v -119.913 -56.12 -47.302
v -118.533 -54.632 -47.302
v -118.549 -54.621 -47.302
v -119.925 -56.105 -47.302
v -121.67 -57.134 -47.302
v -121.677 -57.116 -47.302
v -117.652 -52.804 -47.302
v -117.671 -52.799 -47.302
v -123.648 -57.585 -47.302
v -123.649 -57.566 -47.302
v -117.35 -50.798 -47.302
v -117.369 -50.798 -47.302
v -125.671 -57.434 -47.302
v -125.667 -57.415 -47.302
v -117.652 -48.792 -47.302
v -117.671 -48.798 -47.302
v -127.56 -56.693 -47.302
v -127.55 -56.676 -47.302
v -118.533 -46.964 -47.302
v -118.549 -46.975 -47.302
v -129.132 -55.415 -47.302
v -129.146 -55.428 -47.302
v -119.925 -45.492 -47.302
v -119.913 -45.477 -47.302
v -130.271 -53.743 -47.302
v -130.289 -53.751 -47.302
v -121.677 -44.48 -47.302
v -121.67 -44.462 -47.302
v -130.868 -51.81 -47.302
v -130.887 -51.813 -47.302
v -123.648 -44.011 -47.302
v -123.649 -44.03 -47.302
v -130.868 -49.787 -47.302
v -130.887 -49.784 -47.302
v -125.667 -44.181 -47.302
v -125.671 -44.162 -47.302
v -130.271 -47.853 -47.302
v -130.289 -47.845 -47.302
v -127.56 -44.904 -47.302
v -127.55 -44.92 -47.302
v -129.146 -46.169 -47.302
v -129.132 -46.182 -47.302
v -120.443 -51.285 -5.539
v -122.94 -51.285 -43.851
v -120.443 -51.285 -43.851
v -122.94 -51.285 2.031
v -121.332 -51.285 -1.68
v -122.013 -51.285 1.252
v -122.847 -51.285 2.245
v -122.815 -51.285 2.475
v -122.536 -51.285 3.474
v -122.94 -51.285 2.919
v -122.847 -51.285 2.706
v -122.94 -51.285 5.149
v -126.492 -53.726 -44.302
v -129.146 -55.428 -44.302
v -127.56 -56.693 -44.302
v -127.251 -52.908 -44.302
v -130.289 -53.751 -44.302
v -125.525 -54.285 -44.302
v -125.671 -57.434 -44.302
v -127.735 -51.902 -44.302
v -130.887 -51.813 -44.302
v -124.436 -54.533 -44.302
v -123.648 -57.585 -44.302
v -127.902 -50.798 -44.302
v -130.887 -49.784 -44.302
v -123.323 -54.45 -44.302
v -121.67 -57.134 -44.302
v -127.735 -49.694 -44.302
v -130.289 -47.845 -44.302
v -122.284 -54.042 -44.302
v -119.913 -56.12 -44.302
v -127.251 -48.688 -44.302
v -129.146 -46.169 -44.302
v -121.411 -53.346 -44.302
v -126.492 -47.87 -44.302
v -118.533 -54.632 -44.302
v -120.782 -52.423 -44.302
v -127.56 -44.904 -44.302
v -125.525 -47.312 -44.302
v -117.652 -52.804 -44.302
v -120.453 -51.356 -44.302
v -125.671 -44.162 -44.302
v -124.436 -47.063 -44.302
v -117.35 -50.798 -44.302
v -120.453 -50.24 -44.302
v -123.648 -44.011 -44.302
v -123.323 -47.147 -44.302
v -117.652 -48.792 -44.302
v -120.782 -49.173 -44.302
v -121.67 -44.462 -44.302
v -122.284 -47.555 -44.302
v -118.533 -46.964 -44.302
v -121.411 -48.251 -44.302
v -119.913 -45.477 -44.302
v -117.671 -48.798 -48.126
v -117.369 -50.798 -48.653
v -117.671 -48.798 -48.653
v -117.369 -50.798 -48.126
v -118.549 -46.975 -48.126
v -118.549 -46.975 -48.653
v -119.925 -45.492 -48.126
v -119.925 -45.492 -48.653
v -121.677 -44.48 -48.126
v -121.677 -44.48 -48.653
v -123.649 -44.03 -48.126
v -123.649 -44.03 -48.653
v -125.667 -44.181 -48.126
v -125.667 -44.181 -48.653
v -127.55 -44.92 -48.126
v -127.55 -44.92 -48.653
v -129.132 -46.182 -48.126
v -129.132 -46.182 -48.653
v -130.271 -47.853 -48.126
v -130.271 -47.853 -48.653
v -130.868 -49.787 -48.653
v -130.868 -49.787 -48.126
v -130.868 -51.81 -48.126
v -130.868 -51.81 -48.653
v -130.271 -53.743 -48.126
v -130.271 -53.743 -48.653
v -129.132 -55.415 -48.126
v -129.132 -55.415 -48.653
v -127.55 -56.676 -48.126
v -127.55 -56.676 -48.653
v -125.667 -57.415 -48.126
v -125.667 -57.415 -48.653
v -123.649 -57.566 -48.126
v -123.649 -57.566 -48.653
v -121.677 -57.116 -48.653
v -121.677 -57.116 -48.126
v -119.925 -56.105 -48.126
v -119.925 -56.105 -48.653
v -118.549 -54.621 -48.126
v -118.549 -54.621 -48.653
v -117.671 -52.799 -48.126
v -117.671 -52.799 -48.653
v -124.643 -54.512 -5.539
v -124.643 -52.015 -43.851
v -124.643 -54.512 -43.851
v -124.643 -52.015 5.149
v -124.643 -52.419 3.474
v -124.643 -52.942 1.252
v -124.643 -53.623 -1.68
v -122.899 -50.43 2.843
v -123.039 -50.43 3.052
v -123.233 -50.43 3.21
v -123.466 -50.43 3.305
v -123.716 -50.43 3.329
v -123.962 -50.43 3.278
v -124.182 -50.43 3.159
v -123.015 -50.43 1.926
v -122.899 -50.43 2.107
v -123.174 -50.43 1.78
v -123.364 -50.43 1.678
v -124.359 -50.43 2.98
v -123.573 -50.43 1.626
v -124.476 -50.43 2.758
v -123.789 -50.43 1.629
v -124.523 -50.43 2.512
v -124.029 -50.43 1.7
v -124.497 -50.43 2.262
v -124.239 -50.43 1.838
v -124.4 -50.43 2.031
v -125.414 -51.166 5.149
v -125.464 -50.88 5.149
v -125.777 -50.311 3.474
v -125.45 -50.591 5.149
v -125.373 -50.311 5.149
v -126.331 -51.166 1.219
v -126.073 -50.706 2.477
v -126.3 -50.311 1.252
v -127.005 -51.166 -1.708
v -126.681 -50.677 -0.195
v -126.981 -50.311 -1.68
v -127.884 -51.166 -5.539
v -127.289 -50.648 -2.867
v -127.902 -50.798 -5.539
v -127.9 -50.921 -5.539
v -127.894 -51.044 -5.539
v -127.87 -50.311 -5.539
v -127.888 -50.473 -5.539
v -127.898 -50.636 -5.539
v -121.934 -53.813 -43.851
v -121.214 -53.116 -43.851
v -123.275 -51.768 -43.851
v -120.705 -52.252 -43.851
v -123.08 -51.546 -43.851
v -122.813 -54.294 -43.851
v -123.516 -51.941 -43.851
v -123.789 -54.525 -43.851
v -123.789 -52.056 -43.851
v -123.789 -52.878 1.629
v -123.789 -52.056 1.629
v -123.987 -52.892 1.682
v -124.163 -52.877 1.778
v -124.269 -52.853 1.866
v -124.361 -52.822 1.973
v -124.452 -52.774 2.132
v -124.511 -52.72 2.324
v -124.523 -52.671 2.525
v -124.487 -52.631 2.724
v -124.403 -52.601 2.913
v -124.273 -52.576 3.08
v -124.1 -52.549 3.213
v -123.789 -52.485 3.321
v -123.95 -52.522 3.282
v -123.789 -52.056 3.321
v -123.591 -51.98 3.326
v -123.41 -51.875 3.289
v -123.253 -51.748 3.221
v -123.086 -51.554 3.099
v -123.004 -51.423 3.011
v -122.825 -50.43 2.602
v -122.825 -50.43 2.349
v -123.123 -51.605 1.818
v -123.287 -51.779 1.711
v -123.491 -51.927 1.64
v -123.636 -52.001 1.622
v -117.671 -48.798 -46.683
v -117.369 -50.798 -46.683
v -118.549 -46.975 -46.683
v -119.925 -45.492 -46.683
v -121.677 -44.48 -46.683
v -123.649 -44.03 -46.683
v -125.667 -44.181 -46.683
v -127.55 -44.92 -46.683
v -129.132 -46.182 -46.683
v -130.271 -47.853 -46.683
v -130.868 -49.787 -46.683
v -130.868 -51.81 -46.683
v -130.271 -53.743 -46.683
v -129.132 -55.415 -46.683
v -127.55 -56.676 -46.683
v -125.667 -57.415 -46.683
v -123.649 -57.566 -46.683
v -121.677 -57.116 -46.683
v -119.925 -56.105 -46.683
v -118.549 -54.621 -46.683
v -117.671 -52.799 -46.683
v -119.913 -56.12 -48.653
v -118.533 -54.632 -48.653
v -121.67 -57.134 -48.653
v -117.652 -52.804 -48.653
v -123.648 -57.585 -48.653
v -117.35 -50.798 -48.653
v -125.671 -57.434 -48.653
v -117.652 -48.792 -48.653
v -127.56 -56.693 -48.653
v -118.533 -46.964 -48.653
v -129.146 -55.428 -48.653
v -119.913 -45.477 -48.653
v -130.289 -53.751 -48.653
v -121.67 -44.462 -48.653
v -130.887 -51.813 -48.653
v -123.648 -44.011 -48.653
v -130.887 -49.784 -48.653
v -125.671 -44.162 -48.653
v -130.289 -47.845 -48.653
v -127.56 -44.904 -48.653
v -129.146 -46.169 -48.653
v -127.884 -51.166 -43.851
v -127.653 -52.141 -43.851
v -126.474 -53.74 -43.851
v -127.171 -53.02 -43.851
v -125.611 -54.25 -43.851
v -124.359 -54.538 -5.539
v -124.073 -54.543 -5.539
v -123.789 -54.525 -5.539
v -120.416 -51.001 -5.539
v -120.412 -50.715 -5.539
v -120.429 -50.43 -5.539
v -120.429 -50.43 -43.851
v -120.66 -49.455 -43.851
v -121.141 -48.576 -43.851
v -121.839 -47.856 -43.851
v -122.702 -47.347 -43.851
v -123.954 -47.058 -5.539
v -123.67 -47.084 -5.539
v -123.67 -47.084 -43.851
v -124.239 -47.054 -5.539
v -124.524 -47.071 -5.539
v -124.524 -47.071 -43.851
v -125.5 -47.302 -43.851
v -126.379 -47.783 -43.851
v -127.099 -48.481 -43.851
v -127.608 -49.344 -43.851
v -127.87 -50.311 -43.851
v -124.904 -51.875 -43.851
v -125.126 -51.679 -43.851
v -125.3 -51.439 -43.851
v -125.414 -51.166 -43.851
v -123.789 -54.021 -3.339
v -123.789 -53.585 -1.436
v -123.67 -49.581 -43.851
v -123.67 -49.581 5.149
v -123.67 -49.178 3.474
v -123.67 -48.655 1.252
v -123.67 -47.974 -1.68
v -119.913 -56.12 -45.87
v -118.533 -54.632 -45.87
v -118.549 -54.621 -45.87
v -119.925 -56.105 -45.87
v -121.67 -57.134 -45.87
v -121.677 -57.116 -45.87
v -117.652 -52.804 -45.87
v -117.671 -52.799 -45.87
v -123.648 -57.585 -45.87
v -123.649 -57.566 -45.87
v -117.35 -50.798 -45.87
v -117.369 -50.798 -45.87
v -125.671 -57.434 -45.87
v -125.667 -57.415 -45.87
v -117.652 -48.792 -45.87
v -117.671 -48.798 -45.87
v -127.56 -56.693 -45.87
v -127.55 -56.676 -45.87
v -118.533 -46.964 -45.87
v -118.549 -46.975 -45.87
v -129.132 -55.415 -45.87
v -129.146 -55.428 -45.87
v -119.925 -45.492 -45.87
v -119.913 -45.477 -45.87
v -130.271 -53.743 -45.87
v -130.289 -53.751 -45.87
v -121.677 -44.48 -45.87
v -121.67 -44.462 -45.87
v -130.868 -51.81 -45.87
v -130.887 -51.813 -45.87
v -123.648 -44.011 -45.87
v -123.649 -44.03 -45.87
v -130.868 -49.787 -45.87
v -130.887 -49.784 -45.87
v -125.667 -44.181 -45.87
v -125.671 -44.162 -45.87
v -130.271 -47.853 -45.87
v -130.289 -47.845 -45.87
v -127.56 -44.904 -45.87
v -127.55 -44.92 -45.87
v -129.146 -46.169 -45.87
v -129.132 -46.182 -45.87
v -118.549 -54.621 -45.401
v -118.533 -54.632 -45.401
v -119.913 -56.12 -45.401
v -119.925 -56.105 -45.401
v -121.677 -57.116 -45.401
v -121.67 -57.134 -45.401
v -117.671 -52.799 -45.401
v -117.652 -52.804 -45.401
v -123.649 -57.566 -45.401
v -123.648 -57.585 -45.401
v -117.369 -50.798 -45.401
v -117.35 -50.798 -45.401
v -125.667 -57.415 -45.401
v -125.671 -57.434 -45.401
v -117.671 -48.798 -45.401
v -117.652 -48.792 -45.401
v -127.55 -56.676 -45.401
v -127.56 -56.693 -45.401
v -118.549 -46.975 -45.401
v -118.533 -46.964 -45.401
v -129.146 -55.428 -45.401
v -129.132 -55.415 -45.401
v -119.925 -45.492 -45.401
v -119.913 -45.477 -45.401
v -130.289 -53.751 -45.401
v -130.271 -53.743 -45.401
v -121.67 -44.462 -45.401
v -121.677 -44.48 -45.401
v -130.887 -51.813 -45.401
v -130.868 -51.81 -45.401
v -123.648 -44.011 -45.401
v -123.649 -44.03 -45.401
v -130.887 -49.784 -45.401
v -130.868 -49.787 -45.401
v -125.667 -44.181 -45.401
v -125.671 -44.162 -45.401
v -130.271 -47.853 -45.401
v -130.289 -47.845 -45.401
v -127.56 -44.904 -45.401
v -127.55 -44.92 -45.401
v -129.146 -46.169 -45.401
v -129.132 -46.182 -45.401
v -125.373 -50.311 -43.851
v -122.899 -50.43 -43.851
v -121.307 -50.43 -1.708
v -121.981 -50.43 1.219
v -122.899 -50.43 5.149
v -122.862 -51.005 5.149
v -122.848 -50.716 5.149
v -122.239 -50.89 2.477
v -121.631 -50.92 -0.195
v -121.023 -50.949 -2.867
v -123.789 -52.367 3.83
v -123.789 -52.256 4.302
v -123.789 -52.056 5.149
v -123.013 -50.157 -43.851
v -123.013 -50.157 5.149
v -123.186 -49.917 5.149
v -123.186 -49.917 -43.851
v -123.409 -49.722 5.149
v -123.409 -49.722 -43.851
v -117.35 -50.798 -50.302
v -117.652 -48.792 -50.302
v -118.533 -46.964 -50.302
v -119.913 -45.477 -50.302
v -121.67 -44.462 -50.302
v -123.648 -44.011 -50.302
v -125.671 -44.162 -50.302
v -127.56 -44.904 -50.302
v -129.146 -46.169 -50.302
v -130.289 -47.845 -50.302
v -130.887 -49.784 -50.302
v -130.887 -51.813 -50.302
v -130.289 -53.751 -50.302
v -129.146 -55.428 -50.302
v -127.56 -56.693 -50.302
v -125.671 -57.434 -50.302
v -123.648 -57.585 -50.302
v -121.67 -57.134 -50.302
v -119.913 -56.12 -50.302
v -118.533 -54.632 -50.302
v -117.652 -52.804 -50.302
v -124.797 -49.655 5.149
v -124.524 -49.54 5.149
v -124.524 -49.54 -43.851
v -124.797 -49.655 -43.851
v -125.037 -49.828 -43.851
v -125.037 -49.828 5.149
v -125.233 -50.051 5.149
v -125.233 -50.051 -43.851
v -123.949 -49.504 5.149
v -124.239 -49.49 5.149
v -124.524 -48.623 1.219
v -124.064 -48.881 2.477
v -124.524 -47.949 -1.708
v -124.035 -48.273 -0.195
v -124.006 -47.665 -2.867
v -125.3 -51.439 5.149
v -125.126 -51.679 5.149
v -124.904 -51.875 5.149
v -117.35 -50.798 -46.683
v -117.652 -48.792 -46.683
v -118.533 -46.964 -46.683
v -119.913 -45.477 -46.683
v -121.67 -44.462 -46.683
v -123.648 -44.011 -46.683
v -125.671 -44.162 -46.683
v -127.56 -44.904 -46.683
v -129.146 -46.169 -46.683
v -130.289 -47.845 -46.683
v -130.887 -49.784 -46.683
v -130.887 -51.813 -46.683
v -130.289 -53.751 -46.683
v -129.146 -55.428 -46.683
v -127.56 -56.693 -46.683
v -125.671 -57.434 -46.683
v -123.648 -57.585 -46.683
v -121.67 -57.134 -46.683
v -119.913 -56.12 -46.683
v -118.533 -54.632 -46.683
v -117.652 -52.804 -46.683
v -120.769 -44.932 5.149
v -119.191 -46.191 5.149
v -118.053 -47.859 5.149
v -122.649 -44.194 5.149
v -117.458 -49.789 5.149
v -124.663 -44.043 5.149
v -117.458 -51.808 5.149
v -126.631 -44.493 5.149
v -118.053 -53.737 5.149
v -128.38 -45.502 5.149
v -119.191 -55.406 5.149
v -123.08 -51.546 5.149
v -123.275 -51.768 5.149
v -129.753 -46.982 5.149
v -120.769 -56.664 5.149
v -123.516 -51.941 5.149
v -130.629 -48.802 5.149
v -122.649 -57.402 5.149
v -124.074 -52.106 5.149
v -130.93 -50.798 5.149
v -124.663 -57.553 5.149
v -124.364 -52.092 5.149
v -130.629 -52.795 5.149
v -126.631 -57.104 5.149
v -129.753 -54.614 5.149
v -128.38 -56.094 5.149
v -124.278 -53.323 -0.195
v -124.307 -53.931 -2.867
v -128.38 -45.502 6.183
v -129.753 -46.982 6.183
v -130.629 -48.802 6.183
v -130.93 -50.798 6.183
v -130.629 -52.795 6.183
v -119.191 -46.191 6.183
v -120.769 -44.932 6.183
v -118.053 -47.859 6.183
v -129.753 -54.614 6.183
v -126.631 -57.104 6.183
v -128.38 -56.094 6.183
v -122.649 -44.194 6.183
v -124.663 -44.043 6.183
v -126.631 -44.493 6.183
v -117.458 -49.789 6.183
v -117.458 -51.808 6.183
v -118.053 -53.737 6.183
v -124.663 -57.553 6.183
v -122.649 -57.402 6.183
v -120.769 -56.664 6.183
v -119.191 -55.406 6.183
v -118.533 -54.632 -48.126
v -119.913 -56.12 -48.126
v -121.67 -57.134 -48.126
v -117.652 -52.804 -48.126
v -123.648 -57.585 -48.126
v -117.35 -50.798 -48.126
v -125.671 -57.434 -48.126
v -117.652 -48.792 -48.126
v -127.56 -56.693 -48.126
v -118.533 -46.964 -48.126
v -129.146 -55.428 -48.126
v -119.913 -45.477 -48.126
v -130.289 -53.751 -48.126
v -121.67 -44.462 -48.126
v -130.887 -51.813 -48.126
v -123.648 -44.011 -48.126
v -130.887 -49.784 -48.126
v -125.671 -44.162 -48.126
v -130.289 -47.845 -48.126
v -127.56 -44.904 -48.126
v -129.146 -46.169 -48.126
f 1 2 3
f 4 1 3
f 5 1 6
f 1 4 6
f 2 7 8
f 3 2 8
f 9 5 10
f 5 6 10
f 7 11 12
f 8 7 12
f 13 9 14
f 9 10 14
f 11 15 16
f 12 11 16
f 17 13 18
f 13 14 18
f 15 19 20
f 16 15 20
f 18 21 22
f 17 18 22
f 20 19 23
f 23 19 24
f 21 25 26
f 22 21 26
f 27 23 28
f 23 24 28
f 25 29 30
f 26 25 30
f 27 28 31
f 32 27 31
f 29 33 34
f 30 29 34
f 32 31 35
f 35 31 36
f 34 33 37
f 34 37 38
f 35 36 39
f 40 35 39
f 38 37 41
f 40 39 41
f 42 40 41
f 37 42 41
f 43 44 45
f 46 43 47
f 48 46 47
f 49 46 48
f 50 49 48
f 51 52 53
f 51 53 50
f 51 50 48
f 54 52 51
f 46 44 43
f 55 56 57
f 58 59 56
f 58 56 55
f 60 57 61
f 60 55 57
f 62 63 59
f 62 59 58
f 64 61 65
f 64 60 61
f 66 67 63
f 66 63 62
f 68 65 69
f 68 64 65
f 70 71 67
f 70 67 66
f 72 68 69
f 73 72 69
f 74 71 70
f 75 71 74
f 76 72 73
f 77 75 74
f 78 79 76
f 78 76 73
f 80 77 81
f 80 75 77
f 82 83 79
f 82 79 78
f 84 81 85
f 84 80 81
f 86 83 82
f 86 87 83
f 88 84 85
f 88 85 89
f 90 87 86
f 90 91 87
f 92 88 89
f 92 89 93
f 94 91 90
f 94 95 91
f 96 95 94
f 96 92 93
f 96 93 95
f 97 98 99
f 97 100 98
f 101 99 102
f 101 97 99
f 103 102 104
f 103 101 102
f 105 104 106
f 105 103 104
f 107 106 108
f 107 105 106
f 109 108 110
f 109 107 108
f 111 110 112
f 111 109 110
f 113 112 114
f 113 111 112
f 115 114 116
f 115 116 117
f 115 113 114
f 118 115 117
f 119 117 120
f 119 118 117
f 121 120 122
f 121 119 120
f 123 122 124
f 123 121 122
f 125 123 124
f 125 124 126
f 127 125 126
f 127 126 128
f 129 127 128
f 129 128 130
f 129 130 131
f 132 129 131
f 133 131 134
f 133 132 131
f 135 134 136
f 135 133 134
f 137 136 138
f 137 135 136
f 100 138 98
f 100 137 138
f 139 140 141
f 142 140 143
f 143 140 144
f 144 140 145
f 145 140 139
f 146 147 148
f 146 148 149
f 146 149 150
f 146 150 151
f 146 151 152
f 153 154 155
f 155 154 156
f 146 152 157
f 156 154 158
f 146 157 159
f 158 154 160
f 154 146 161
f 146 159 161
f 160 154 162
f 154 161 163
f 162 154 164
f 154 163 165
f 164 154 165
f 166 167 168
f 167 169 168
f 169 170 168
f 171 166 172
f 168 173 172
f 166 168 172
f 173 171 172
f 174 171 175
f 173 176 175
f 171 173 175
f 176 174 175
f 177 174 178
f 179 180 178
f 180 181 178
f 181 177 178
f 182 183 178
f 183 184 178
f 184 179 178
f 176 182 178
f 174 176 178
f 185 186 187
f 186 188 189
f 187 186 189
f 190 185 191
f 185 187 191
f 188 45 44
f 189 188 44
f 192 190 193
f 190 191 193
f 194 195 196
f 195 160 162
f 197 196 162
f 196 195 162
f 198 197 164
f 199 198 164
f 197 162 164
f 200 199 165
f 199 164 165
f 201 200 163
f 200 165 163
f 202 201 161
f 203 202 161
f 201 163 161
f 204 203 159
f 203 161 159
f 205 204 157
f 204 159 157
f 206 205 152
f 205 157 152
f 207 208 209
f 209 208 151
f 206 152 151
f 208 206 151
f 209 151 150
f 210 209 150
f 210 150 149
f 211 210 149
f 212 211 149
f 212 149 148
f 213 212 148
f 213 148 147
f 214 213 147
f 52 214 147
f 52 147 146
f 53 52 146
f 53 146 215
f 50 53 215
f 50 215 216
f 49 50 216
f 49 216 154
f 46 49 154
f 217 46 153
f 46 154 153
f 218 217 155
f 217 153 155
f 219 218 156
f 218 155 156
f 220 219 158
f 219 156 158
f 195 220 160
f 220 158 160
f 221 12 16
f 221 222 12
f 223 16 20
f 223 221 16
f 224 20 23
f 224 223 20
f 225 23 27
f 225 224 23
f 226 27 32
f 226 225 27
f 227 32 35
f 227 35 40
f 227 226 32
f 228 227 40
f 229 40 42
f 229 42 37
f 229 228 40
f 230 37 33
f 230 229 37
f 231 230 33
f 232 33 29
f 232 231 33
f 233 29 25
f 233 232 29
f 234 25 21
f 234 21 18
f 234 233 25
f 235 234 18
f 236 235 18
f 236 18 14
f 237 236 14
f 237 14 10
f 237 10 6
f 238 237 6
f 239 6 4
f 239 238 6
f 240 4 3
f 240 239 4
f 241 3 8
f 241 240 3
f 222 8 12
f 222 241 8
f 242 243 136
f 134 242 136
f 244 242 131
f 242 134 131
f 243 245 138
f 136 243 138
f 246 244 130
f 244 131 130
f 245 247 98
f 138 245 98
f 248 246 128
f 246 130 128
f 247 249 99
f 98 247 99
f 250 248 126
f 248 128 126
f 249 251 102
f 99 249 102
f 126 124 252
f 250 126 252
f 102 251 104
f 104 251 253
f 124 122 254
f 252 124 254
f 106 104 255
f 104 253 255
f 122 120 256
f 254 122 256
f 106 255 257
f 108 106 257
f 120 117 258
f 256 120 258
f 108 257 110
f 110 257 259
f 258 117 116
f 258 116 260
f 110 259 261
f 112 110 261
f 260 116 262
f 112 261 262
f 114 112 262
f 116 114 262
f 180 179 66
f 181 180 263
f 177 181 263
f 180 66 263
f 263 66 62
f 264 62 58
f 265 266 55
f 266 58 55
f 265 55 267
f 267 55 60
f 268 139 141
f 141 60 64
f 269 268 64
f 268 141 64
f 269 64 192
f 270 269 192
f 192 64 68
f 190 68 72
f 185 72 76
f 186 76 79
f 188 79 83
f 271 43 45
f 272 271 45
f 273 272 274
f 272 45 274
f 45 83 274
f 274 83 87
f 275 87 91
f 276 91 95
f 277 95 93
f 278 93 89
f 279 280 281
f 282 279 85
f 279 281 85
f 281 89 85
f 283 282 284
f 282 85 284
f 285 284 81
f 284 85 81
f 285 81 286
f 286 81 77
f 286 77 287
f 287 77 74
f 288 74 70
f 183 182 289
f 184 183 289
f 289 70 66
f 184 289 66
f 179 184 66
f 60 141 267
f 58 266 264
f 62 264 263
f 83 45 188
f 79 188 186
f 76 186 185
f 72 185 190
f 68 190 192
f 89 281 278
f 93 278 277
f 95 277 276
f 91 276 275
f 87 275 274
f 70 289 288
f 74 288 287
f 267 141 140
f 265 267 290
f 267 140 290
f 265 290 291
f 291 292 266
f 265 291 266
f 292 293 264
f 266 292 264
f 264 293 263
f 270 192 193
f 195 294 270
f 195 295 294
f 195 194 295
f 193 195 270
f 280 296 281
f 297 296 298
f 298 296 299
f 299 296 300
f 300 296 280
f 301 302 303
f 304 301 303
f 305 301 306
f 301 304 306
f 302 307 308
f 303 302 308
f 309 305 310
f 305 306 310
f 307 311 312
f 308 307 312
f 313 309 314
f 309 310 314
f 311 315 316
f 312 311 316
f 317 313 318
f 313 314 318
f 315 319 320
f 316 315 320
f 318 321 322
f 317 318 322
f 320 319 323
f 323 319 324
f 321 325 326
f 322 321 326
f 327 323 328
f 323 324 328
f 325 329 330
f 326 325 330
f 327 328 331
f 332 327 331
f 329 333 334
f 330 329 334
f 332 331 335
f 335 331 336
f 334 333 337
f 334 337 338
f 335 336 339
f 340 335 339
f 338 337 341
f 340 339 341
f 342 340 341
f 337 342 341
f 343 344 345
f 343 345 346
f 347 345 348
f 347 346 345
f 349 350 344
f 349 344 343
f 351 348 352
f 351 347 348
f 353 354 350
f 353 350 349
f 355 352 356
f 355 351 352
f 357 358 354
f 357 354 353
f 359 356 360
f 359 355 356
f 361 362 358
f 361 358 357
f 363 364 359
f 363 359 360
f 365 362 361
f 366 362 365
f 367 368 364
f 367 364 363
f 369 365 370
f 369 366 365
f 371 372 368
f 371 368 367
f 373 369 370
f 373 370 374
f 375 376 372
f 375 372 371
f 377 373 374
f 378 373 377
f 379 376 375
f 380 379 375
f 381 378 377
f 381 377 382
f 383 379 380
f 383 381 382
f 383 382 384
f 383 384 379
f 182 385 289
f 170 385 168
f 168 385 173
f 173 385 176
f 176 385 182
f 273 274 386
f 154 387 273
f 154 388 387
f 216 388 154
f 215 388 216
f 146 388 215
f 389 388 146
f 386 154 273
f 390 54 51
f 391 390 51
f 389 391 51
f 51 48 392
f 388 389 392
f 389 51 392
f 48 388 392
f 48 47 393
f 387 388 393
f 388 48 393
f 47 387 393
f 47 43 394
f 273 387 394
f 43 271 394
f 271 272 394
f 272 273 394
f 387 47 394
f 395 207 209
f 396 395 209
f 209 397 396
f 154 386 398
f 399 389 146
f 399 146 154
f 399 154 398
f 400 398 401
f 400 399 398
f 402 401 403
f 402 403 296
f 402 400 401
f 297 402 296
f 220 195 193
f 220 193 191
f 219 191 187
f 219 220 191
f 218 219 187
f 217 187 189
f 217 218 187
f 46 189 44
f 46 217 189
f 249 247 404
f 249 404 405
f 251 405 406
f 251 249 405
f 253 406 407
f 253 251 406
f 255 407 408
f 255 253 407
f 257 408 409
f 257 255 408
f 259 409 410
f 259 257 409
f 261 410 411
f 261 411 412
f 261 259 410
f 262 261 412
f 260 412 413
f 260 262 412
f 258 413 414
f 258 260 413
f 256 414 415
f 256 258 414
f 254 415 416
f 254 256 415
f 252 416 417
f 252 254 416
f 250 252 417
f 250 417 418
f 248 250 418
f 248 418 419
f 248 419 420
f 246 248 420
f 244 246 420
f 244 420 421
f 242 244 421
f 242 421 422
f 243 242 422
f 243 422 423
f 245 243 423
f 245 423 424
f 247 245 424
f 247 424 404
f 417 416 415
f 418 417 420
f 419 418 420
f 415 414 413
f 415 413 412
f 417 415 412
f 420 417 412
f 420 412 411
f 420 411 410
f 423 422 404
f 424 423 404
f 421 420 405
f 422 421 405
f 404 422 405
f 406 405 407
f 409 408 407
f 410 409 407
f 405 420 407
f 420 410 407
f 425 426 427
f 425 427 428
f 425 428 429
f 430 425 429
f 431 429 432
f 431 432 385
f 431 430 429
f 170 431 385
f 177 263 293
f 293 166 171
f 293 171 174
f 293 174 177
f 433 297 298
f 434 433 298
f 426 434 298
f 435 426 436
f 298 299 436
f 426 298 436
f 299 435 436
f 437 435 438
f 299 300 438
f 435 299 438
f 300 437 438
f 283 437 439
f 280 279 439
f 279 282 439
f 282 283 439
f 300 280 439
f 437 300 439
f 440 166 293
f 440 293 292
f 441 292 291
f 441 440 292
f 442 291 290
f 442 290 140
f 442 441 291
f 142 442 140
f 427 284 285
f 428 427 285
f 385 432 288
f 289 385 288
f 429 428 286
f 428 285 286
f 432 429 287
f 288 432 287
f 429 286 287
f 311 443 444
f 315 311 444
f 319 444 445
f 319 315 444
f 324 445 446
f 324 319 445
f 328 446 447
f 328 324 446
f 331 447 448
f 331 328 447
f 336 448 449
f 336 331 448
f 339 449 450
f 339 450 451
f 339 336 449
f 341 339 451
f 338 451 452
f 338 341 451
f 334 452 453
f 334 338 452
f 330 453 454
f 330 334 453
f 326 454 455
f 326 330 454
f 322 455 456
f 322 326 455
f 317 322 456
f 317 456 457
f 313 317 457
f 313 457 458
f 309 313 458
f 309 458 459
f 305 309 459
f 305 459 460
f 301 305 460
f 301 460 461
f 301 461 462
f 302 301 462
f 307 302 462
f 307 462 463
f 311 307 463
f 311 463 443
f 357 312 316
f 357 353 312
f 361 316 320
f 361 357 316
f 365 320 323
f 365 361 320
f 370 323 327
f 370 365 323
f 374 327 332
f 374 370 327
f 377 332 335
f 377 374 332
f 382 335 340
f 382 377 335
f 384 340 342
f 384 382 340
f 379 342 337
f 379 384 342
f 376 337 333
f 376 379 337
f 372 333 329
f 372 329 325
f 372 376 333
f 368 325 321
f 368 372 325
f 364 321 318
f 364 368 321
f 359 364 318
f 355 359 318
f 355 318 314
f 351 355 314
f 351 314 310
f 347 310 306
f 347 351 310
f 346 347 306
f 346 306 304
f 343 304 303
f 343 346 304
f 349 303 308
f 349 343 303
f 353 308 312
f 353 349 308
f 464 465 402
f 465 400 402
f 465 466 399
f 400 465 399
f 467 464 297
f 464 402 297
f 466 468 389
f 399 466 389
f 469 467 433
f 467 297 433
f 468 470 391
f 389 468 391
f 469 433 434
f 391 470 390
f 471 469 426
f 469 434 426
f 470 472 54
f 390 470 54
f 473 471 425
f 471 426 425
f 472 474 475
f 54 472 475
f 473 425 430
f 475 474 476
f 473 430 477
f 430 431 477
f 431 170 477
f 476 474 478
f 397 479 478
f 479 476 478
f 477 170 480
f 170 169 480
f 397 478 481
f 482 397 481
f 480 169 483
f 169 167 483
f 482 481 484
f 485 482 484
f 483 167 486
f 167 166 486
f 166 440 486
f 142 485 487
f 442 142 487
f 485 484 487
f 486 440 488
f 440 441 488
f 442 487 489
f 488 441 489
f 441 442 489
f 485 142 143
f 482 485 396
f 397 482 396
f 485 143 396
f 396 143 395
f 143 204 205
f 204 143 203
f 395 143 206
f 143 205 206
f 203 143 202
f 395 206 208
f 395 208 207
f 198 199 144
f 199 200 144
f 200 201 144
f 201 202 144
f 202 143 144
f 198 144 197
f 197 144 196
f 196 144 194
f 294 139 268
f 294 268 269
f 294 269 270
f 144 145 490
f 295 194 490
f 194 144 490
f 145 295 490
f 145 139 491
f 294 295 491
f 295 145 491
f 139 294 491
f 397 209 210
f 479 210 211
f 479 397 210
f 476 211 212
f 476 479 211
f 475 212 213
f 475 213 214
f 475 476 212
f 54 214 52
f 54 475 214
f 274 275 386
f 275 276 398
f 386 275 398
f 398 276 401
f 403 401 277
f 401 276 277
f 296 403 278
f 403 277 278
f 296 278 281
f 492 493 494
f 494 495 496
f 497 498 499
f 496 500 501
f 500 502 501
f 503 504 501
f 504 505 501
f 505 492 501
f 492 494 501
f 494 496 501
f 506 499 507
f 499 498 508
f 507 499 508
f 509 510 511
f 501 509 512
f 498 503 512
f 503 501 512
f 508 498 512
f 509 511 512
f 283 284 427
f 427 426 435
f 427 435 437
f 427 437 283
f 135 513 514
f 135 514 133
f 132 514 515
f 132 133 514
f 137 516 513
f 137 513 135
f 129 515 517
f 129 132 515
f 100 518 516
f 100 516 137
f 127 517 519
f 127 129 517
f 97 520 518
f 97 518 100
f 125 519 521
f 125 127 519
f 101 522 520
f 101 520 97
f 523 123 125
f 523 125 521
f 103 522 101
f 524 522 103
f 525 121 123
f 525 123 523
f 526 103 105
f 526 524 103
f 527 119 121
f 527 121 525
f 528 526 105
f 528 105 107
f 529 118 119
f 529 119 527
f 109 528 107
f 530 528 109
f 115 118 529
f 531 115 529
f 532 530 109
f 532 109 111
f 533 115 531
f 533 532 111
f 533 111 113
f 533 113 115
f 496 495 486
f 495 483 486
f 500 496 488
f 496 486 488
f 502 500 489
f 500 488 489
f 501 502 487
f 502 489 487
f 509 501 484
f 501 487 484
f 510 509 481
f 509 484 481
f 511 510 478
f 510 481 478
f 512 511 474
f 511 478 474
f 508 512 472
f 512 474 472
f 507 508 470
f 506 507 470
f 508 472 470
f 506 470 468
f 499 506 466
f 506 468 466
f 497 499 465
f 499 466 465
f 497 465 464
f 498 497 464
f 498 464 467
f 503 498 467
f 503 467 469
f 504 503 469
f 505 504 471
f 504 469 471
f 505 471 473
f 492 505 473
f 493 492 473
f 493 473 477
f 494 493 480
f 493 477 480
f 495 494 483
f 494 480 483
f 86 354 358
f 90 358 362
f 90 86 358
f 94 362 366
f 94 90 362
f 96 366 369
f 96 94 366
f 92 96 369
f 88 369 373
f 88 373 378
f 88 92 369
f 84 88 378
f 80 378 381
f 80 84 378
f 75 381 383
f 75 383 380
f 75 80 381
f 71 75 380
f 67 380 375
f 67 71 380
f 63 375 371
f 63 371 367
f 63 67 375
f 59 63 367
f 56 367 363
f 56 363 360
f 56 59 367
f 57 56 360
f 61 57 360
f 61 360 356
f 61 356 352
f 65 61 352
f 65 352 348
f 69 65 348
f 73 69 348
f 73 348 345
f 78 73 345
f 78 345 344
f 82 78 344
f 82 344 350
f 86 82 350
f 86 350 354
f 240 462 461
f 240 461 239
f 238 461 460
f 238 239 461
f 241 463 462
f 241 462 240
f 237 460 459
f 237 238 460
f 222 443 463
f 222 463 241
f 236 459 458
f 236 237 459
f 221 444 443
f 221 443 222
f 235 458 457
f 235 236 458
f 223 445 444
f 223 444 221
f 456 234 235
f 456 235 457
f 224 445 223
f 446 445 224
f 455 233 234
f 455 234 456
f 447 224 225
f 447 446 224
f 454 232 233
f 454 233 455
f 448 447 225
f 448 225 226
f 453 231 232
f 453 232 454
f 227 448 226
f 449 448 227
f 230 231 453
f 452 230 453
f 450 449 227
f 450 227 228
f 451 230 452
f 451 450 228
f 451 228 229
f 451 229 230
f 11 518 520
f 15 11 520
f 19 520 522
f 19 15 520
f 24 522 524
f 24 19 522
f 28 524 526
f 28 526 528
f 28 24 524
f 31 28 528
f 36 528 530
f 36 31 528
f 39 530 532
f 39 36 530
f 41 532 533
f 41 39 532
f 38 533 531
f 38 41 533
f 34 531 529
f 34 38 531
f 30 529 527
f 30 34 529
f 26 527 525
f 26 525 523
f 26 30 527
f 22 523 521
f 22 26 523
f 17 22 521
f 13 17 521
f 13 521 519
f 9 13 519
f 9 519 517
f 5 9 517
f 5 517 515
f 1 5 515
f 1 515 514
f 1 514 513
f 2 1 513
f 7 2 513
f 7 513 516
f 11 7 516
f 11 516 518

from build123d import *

# Parameters (mm, degrees)
SKETCH2_R           = 6.806368693
BOSS_EXTRUDE1_DEPTH = 6
CUT_EXTRUDE1_DEPTH  = 49
SKETCH5_W           = 0.469385106
SKETCH5_H           = 0.019240939
SKETCH5_W_2         = 0.618798201
SKETCH5_W_3         = 0.526460496
SKETCH7_R           = 0.854461161
CUT_EXTRUDE2_DEPTH  = 10


with BuildPart() as part:
    # Sketch2 → Boss-Extrude1 (new body)
    with BuildSketch(Plane.XY.offset(-44.302178105)):
        with Locations((-124.156373602, -50.798156381)):
            Circle(SKETCH2_R)
    extrude(amount=-BOSS_EXTRUDE1_DEPTH)

    # Sketch3 → Revolve1 (revolve)
    with BuildSketch(Plane.ZY.offset(124.156373602), mode=Mode.PRIVATE) as revolve1_sk:
        Polygon((-44.302178105, -50.798156381), (6.183197751, -50.798156381), (6.183197751, -44.024347355), (5.148759689, -44.024347355), (5.148759689, -49.48766214), (-5.538916802, -47.052727869), (-44.302178105, -47.052727869), align=None)
    revolve(revolve1_sk.sketch.rotate(Axis((-124.156373602, -50.798156381, -44.302178105), (0, 0, 1)), 90), axis=Axis((-124.156373602, -50.798156381, -44.302178105), (0, 0, 1)))

    # Sketch4 → Cut-Extrude1 (cut)
    with BuildSketch(Plane(origin=(0, 0, 5.148759689), x_dir=(-1, 0, 0), z_dir=(0, 0, -1))):
        with BuildLine():
            ThreePointArc((122.898541187, -50.430389102), (123.18629962, -49.917048201), (123.669679719, -49.581388441))
            Line((123.669679719, -49.581388441), (123.669679719, -46.278106739))
            ThreePointArc((123.669679719, -46.278106739), (120.899785056, -47.626035521), (119.625097078, -50.430389102))
            Line((119.625097078, -50.430389102), (122.898541187, -50.430389102))
        make_face()
        with BuildLine():
            Line((124.524140881, -46.266879857), (124.524140881, -49.540323966))
            ThreePointArc((124.524140881, -49.540323966), (125.037481781, -49.828082399), (125.373141541, -50.311462498))
            Line((125.373141541, -50.311462498), (128.676423243, -50.311462498))
            ThreePointArc((128.676423243, -50.311462498), (127.328494461, -47.541567835), (124.524140881, -46.266879857))
        make_face()
        with BuildLine():
            Line((128.687650125, -51.16592366), (125.414206016, -51.16592366))
            ThreePointArc((125.414206016, -51.16592366), (125.126447583, -51.67926456), (124.643067484, -52.01492432))
            Line((124.643067484, -52.01492432), (124.643067484, -55.318206023))
            ThreePointArc((124.643067484, -55.318206023), (127.412962147, -53.97027724), (128.687650125, -51.16592366))
        make_face()
        with BuildLine():
            ThreePointArc((123.788606323, -52.055988795), (123.275265422, -51.768230362), (122.939605662, -51.284850263))
            Line((122.939605662, -51.284850263), (119.63632396, -51.284850263))
            ThreePointArc((119.63632396, -51.284850263), (120.984252742, -54.054744926), (123.788606323, -55.329432904))
            Line((123.788606323, -55.329432904), (123.788606323, -52.055988795))
        make_face()
    extrude(amount=CUT_EXTRUDE1_DEPTH, mode=Mode.SUBTRACT)

    # Sketch5 → Cut-Revolve2 (revolve, cut)
    with BuildSketch(Plane.ZY.offset(124.156373602), mode=Mode.PRIVATE) as cut_revolve2_sk:
        with Locations((-45.635234776, -44.001408158)):
            Rectangle(SKETCH5_W, SKETCH5_H)
        with Locations((-46.992779005, -44.001408158)):
            Rectangle(SKETCH5_W_2, SKETCH5_H)
        with Locations((-48.389416848, -44.001408158)):
            Rectangle(SKETCH5_W_3, SKETCH5_H)
    revolve(cut_revolve2_sk.sketch.rotate(Axis((-124.156373602, -50.798156381, -50.302178105), (0, 0, 1)), 270), axis=Axis((-124.156373602, -50.798156381, -50.302178105), (0, 0, 1)), mode=Mode.SUBTRACT)

    # Sketch7 → Cut-Extrude2 (cut)
    with BuildSketch(Plane(origin=(0, -50.430389102, 0), x_dir=(1, 0, 0), z_dir=(0, 1, 0))):
        with Locations(Location((-123.669679719, -2.475298292, 0), (0, 0, 98.000581908))):
            Circle(SKETCH7_R)
    extrude(amount=-CUT_EXTRUDE2_DEPTH, mode=Mode.SUBTRACT)


solid = part.part
